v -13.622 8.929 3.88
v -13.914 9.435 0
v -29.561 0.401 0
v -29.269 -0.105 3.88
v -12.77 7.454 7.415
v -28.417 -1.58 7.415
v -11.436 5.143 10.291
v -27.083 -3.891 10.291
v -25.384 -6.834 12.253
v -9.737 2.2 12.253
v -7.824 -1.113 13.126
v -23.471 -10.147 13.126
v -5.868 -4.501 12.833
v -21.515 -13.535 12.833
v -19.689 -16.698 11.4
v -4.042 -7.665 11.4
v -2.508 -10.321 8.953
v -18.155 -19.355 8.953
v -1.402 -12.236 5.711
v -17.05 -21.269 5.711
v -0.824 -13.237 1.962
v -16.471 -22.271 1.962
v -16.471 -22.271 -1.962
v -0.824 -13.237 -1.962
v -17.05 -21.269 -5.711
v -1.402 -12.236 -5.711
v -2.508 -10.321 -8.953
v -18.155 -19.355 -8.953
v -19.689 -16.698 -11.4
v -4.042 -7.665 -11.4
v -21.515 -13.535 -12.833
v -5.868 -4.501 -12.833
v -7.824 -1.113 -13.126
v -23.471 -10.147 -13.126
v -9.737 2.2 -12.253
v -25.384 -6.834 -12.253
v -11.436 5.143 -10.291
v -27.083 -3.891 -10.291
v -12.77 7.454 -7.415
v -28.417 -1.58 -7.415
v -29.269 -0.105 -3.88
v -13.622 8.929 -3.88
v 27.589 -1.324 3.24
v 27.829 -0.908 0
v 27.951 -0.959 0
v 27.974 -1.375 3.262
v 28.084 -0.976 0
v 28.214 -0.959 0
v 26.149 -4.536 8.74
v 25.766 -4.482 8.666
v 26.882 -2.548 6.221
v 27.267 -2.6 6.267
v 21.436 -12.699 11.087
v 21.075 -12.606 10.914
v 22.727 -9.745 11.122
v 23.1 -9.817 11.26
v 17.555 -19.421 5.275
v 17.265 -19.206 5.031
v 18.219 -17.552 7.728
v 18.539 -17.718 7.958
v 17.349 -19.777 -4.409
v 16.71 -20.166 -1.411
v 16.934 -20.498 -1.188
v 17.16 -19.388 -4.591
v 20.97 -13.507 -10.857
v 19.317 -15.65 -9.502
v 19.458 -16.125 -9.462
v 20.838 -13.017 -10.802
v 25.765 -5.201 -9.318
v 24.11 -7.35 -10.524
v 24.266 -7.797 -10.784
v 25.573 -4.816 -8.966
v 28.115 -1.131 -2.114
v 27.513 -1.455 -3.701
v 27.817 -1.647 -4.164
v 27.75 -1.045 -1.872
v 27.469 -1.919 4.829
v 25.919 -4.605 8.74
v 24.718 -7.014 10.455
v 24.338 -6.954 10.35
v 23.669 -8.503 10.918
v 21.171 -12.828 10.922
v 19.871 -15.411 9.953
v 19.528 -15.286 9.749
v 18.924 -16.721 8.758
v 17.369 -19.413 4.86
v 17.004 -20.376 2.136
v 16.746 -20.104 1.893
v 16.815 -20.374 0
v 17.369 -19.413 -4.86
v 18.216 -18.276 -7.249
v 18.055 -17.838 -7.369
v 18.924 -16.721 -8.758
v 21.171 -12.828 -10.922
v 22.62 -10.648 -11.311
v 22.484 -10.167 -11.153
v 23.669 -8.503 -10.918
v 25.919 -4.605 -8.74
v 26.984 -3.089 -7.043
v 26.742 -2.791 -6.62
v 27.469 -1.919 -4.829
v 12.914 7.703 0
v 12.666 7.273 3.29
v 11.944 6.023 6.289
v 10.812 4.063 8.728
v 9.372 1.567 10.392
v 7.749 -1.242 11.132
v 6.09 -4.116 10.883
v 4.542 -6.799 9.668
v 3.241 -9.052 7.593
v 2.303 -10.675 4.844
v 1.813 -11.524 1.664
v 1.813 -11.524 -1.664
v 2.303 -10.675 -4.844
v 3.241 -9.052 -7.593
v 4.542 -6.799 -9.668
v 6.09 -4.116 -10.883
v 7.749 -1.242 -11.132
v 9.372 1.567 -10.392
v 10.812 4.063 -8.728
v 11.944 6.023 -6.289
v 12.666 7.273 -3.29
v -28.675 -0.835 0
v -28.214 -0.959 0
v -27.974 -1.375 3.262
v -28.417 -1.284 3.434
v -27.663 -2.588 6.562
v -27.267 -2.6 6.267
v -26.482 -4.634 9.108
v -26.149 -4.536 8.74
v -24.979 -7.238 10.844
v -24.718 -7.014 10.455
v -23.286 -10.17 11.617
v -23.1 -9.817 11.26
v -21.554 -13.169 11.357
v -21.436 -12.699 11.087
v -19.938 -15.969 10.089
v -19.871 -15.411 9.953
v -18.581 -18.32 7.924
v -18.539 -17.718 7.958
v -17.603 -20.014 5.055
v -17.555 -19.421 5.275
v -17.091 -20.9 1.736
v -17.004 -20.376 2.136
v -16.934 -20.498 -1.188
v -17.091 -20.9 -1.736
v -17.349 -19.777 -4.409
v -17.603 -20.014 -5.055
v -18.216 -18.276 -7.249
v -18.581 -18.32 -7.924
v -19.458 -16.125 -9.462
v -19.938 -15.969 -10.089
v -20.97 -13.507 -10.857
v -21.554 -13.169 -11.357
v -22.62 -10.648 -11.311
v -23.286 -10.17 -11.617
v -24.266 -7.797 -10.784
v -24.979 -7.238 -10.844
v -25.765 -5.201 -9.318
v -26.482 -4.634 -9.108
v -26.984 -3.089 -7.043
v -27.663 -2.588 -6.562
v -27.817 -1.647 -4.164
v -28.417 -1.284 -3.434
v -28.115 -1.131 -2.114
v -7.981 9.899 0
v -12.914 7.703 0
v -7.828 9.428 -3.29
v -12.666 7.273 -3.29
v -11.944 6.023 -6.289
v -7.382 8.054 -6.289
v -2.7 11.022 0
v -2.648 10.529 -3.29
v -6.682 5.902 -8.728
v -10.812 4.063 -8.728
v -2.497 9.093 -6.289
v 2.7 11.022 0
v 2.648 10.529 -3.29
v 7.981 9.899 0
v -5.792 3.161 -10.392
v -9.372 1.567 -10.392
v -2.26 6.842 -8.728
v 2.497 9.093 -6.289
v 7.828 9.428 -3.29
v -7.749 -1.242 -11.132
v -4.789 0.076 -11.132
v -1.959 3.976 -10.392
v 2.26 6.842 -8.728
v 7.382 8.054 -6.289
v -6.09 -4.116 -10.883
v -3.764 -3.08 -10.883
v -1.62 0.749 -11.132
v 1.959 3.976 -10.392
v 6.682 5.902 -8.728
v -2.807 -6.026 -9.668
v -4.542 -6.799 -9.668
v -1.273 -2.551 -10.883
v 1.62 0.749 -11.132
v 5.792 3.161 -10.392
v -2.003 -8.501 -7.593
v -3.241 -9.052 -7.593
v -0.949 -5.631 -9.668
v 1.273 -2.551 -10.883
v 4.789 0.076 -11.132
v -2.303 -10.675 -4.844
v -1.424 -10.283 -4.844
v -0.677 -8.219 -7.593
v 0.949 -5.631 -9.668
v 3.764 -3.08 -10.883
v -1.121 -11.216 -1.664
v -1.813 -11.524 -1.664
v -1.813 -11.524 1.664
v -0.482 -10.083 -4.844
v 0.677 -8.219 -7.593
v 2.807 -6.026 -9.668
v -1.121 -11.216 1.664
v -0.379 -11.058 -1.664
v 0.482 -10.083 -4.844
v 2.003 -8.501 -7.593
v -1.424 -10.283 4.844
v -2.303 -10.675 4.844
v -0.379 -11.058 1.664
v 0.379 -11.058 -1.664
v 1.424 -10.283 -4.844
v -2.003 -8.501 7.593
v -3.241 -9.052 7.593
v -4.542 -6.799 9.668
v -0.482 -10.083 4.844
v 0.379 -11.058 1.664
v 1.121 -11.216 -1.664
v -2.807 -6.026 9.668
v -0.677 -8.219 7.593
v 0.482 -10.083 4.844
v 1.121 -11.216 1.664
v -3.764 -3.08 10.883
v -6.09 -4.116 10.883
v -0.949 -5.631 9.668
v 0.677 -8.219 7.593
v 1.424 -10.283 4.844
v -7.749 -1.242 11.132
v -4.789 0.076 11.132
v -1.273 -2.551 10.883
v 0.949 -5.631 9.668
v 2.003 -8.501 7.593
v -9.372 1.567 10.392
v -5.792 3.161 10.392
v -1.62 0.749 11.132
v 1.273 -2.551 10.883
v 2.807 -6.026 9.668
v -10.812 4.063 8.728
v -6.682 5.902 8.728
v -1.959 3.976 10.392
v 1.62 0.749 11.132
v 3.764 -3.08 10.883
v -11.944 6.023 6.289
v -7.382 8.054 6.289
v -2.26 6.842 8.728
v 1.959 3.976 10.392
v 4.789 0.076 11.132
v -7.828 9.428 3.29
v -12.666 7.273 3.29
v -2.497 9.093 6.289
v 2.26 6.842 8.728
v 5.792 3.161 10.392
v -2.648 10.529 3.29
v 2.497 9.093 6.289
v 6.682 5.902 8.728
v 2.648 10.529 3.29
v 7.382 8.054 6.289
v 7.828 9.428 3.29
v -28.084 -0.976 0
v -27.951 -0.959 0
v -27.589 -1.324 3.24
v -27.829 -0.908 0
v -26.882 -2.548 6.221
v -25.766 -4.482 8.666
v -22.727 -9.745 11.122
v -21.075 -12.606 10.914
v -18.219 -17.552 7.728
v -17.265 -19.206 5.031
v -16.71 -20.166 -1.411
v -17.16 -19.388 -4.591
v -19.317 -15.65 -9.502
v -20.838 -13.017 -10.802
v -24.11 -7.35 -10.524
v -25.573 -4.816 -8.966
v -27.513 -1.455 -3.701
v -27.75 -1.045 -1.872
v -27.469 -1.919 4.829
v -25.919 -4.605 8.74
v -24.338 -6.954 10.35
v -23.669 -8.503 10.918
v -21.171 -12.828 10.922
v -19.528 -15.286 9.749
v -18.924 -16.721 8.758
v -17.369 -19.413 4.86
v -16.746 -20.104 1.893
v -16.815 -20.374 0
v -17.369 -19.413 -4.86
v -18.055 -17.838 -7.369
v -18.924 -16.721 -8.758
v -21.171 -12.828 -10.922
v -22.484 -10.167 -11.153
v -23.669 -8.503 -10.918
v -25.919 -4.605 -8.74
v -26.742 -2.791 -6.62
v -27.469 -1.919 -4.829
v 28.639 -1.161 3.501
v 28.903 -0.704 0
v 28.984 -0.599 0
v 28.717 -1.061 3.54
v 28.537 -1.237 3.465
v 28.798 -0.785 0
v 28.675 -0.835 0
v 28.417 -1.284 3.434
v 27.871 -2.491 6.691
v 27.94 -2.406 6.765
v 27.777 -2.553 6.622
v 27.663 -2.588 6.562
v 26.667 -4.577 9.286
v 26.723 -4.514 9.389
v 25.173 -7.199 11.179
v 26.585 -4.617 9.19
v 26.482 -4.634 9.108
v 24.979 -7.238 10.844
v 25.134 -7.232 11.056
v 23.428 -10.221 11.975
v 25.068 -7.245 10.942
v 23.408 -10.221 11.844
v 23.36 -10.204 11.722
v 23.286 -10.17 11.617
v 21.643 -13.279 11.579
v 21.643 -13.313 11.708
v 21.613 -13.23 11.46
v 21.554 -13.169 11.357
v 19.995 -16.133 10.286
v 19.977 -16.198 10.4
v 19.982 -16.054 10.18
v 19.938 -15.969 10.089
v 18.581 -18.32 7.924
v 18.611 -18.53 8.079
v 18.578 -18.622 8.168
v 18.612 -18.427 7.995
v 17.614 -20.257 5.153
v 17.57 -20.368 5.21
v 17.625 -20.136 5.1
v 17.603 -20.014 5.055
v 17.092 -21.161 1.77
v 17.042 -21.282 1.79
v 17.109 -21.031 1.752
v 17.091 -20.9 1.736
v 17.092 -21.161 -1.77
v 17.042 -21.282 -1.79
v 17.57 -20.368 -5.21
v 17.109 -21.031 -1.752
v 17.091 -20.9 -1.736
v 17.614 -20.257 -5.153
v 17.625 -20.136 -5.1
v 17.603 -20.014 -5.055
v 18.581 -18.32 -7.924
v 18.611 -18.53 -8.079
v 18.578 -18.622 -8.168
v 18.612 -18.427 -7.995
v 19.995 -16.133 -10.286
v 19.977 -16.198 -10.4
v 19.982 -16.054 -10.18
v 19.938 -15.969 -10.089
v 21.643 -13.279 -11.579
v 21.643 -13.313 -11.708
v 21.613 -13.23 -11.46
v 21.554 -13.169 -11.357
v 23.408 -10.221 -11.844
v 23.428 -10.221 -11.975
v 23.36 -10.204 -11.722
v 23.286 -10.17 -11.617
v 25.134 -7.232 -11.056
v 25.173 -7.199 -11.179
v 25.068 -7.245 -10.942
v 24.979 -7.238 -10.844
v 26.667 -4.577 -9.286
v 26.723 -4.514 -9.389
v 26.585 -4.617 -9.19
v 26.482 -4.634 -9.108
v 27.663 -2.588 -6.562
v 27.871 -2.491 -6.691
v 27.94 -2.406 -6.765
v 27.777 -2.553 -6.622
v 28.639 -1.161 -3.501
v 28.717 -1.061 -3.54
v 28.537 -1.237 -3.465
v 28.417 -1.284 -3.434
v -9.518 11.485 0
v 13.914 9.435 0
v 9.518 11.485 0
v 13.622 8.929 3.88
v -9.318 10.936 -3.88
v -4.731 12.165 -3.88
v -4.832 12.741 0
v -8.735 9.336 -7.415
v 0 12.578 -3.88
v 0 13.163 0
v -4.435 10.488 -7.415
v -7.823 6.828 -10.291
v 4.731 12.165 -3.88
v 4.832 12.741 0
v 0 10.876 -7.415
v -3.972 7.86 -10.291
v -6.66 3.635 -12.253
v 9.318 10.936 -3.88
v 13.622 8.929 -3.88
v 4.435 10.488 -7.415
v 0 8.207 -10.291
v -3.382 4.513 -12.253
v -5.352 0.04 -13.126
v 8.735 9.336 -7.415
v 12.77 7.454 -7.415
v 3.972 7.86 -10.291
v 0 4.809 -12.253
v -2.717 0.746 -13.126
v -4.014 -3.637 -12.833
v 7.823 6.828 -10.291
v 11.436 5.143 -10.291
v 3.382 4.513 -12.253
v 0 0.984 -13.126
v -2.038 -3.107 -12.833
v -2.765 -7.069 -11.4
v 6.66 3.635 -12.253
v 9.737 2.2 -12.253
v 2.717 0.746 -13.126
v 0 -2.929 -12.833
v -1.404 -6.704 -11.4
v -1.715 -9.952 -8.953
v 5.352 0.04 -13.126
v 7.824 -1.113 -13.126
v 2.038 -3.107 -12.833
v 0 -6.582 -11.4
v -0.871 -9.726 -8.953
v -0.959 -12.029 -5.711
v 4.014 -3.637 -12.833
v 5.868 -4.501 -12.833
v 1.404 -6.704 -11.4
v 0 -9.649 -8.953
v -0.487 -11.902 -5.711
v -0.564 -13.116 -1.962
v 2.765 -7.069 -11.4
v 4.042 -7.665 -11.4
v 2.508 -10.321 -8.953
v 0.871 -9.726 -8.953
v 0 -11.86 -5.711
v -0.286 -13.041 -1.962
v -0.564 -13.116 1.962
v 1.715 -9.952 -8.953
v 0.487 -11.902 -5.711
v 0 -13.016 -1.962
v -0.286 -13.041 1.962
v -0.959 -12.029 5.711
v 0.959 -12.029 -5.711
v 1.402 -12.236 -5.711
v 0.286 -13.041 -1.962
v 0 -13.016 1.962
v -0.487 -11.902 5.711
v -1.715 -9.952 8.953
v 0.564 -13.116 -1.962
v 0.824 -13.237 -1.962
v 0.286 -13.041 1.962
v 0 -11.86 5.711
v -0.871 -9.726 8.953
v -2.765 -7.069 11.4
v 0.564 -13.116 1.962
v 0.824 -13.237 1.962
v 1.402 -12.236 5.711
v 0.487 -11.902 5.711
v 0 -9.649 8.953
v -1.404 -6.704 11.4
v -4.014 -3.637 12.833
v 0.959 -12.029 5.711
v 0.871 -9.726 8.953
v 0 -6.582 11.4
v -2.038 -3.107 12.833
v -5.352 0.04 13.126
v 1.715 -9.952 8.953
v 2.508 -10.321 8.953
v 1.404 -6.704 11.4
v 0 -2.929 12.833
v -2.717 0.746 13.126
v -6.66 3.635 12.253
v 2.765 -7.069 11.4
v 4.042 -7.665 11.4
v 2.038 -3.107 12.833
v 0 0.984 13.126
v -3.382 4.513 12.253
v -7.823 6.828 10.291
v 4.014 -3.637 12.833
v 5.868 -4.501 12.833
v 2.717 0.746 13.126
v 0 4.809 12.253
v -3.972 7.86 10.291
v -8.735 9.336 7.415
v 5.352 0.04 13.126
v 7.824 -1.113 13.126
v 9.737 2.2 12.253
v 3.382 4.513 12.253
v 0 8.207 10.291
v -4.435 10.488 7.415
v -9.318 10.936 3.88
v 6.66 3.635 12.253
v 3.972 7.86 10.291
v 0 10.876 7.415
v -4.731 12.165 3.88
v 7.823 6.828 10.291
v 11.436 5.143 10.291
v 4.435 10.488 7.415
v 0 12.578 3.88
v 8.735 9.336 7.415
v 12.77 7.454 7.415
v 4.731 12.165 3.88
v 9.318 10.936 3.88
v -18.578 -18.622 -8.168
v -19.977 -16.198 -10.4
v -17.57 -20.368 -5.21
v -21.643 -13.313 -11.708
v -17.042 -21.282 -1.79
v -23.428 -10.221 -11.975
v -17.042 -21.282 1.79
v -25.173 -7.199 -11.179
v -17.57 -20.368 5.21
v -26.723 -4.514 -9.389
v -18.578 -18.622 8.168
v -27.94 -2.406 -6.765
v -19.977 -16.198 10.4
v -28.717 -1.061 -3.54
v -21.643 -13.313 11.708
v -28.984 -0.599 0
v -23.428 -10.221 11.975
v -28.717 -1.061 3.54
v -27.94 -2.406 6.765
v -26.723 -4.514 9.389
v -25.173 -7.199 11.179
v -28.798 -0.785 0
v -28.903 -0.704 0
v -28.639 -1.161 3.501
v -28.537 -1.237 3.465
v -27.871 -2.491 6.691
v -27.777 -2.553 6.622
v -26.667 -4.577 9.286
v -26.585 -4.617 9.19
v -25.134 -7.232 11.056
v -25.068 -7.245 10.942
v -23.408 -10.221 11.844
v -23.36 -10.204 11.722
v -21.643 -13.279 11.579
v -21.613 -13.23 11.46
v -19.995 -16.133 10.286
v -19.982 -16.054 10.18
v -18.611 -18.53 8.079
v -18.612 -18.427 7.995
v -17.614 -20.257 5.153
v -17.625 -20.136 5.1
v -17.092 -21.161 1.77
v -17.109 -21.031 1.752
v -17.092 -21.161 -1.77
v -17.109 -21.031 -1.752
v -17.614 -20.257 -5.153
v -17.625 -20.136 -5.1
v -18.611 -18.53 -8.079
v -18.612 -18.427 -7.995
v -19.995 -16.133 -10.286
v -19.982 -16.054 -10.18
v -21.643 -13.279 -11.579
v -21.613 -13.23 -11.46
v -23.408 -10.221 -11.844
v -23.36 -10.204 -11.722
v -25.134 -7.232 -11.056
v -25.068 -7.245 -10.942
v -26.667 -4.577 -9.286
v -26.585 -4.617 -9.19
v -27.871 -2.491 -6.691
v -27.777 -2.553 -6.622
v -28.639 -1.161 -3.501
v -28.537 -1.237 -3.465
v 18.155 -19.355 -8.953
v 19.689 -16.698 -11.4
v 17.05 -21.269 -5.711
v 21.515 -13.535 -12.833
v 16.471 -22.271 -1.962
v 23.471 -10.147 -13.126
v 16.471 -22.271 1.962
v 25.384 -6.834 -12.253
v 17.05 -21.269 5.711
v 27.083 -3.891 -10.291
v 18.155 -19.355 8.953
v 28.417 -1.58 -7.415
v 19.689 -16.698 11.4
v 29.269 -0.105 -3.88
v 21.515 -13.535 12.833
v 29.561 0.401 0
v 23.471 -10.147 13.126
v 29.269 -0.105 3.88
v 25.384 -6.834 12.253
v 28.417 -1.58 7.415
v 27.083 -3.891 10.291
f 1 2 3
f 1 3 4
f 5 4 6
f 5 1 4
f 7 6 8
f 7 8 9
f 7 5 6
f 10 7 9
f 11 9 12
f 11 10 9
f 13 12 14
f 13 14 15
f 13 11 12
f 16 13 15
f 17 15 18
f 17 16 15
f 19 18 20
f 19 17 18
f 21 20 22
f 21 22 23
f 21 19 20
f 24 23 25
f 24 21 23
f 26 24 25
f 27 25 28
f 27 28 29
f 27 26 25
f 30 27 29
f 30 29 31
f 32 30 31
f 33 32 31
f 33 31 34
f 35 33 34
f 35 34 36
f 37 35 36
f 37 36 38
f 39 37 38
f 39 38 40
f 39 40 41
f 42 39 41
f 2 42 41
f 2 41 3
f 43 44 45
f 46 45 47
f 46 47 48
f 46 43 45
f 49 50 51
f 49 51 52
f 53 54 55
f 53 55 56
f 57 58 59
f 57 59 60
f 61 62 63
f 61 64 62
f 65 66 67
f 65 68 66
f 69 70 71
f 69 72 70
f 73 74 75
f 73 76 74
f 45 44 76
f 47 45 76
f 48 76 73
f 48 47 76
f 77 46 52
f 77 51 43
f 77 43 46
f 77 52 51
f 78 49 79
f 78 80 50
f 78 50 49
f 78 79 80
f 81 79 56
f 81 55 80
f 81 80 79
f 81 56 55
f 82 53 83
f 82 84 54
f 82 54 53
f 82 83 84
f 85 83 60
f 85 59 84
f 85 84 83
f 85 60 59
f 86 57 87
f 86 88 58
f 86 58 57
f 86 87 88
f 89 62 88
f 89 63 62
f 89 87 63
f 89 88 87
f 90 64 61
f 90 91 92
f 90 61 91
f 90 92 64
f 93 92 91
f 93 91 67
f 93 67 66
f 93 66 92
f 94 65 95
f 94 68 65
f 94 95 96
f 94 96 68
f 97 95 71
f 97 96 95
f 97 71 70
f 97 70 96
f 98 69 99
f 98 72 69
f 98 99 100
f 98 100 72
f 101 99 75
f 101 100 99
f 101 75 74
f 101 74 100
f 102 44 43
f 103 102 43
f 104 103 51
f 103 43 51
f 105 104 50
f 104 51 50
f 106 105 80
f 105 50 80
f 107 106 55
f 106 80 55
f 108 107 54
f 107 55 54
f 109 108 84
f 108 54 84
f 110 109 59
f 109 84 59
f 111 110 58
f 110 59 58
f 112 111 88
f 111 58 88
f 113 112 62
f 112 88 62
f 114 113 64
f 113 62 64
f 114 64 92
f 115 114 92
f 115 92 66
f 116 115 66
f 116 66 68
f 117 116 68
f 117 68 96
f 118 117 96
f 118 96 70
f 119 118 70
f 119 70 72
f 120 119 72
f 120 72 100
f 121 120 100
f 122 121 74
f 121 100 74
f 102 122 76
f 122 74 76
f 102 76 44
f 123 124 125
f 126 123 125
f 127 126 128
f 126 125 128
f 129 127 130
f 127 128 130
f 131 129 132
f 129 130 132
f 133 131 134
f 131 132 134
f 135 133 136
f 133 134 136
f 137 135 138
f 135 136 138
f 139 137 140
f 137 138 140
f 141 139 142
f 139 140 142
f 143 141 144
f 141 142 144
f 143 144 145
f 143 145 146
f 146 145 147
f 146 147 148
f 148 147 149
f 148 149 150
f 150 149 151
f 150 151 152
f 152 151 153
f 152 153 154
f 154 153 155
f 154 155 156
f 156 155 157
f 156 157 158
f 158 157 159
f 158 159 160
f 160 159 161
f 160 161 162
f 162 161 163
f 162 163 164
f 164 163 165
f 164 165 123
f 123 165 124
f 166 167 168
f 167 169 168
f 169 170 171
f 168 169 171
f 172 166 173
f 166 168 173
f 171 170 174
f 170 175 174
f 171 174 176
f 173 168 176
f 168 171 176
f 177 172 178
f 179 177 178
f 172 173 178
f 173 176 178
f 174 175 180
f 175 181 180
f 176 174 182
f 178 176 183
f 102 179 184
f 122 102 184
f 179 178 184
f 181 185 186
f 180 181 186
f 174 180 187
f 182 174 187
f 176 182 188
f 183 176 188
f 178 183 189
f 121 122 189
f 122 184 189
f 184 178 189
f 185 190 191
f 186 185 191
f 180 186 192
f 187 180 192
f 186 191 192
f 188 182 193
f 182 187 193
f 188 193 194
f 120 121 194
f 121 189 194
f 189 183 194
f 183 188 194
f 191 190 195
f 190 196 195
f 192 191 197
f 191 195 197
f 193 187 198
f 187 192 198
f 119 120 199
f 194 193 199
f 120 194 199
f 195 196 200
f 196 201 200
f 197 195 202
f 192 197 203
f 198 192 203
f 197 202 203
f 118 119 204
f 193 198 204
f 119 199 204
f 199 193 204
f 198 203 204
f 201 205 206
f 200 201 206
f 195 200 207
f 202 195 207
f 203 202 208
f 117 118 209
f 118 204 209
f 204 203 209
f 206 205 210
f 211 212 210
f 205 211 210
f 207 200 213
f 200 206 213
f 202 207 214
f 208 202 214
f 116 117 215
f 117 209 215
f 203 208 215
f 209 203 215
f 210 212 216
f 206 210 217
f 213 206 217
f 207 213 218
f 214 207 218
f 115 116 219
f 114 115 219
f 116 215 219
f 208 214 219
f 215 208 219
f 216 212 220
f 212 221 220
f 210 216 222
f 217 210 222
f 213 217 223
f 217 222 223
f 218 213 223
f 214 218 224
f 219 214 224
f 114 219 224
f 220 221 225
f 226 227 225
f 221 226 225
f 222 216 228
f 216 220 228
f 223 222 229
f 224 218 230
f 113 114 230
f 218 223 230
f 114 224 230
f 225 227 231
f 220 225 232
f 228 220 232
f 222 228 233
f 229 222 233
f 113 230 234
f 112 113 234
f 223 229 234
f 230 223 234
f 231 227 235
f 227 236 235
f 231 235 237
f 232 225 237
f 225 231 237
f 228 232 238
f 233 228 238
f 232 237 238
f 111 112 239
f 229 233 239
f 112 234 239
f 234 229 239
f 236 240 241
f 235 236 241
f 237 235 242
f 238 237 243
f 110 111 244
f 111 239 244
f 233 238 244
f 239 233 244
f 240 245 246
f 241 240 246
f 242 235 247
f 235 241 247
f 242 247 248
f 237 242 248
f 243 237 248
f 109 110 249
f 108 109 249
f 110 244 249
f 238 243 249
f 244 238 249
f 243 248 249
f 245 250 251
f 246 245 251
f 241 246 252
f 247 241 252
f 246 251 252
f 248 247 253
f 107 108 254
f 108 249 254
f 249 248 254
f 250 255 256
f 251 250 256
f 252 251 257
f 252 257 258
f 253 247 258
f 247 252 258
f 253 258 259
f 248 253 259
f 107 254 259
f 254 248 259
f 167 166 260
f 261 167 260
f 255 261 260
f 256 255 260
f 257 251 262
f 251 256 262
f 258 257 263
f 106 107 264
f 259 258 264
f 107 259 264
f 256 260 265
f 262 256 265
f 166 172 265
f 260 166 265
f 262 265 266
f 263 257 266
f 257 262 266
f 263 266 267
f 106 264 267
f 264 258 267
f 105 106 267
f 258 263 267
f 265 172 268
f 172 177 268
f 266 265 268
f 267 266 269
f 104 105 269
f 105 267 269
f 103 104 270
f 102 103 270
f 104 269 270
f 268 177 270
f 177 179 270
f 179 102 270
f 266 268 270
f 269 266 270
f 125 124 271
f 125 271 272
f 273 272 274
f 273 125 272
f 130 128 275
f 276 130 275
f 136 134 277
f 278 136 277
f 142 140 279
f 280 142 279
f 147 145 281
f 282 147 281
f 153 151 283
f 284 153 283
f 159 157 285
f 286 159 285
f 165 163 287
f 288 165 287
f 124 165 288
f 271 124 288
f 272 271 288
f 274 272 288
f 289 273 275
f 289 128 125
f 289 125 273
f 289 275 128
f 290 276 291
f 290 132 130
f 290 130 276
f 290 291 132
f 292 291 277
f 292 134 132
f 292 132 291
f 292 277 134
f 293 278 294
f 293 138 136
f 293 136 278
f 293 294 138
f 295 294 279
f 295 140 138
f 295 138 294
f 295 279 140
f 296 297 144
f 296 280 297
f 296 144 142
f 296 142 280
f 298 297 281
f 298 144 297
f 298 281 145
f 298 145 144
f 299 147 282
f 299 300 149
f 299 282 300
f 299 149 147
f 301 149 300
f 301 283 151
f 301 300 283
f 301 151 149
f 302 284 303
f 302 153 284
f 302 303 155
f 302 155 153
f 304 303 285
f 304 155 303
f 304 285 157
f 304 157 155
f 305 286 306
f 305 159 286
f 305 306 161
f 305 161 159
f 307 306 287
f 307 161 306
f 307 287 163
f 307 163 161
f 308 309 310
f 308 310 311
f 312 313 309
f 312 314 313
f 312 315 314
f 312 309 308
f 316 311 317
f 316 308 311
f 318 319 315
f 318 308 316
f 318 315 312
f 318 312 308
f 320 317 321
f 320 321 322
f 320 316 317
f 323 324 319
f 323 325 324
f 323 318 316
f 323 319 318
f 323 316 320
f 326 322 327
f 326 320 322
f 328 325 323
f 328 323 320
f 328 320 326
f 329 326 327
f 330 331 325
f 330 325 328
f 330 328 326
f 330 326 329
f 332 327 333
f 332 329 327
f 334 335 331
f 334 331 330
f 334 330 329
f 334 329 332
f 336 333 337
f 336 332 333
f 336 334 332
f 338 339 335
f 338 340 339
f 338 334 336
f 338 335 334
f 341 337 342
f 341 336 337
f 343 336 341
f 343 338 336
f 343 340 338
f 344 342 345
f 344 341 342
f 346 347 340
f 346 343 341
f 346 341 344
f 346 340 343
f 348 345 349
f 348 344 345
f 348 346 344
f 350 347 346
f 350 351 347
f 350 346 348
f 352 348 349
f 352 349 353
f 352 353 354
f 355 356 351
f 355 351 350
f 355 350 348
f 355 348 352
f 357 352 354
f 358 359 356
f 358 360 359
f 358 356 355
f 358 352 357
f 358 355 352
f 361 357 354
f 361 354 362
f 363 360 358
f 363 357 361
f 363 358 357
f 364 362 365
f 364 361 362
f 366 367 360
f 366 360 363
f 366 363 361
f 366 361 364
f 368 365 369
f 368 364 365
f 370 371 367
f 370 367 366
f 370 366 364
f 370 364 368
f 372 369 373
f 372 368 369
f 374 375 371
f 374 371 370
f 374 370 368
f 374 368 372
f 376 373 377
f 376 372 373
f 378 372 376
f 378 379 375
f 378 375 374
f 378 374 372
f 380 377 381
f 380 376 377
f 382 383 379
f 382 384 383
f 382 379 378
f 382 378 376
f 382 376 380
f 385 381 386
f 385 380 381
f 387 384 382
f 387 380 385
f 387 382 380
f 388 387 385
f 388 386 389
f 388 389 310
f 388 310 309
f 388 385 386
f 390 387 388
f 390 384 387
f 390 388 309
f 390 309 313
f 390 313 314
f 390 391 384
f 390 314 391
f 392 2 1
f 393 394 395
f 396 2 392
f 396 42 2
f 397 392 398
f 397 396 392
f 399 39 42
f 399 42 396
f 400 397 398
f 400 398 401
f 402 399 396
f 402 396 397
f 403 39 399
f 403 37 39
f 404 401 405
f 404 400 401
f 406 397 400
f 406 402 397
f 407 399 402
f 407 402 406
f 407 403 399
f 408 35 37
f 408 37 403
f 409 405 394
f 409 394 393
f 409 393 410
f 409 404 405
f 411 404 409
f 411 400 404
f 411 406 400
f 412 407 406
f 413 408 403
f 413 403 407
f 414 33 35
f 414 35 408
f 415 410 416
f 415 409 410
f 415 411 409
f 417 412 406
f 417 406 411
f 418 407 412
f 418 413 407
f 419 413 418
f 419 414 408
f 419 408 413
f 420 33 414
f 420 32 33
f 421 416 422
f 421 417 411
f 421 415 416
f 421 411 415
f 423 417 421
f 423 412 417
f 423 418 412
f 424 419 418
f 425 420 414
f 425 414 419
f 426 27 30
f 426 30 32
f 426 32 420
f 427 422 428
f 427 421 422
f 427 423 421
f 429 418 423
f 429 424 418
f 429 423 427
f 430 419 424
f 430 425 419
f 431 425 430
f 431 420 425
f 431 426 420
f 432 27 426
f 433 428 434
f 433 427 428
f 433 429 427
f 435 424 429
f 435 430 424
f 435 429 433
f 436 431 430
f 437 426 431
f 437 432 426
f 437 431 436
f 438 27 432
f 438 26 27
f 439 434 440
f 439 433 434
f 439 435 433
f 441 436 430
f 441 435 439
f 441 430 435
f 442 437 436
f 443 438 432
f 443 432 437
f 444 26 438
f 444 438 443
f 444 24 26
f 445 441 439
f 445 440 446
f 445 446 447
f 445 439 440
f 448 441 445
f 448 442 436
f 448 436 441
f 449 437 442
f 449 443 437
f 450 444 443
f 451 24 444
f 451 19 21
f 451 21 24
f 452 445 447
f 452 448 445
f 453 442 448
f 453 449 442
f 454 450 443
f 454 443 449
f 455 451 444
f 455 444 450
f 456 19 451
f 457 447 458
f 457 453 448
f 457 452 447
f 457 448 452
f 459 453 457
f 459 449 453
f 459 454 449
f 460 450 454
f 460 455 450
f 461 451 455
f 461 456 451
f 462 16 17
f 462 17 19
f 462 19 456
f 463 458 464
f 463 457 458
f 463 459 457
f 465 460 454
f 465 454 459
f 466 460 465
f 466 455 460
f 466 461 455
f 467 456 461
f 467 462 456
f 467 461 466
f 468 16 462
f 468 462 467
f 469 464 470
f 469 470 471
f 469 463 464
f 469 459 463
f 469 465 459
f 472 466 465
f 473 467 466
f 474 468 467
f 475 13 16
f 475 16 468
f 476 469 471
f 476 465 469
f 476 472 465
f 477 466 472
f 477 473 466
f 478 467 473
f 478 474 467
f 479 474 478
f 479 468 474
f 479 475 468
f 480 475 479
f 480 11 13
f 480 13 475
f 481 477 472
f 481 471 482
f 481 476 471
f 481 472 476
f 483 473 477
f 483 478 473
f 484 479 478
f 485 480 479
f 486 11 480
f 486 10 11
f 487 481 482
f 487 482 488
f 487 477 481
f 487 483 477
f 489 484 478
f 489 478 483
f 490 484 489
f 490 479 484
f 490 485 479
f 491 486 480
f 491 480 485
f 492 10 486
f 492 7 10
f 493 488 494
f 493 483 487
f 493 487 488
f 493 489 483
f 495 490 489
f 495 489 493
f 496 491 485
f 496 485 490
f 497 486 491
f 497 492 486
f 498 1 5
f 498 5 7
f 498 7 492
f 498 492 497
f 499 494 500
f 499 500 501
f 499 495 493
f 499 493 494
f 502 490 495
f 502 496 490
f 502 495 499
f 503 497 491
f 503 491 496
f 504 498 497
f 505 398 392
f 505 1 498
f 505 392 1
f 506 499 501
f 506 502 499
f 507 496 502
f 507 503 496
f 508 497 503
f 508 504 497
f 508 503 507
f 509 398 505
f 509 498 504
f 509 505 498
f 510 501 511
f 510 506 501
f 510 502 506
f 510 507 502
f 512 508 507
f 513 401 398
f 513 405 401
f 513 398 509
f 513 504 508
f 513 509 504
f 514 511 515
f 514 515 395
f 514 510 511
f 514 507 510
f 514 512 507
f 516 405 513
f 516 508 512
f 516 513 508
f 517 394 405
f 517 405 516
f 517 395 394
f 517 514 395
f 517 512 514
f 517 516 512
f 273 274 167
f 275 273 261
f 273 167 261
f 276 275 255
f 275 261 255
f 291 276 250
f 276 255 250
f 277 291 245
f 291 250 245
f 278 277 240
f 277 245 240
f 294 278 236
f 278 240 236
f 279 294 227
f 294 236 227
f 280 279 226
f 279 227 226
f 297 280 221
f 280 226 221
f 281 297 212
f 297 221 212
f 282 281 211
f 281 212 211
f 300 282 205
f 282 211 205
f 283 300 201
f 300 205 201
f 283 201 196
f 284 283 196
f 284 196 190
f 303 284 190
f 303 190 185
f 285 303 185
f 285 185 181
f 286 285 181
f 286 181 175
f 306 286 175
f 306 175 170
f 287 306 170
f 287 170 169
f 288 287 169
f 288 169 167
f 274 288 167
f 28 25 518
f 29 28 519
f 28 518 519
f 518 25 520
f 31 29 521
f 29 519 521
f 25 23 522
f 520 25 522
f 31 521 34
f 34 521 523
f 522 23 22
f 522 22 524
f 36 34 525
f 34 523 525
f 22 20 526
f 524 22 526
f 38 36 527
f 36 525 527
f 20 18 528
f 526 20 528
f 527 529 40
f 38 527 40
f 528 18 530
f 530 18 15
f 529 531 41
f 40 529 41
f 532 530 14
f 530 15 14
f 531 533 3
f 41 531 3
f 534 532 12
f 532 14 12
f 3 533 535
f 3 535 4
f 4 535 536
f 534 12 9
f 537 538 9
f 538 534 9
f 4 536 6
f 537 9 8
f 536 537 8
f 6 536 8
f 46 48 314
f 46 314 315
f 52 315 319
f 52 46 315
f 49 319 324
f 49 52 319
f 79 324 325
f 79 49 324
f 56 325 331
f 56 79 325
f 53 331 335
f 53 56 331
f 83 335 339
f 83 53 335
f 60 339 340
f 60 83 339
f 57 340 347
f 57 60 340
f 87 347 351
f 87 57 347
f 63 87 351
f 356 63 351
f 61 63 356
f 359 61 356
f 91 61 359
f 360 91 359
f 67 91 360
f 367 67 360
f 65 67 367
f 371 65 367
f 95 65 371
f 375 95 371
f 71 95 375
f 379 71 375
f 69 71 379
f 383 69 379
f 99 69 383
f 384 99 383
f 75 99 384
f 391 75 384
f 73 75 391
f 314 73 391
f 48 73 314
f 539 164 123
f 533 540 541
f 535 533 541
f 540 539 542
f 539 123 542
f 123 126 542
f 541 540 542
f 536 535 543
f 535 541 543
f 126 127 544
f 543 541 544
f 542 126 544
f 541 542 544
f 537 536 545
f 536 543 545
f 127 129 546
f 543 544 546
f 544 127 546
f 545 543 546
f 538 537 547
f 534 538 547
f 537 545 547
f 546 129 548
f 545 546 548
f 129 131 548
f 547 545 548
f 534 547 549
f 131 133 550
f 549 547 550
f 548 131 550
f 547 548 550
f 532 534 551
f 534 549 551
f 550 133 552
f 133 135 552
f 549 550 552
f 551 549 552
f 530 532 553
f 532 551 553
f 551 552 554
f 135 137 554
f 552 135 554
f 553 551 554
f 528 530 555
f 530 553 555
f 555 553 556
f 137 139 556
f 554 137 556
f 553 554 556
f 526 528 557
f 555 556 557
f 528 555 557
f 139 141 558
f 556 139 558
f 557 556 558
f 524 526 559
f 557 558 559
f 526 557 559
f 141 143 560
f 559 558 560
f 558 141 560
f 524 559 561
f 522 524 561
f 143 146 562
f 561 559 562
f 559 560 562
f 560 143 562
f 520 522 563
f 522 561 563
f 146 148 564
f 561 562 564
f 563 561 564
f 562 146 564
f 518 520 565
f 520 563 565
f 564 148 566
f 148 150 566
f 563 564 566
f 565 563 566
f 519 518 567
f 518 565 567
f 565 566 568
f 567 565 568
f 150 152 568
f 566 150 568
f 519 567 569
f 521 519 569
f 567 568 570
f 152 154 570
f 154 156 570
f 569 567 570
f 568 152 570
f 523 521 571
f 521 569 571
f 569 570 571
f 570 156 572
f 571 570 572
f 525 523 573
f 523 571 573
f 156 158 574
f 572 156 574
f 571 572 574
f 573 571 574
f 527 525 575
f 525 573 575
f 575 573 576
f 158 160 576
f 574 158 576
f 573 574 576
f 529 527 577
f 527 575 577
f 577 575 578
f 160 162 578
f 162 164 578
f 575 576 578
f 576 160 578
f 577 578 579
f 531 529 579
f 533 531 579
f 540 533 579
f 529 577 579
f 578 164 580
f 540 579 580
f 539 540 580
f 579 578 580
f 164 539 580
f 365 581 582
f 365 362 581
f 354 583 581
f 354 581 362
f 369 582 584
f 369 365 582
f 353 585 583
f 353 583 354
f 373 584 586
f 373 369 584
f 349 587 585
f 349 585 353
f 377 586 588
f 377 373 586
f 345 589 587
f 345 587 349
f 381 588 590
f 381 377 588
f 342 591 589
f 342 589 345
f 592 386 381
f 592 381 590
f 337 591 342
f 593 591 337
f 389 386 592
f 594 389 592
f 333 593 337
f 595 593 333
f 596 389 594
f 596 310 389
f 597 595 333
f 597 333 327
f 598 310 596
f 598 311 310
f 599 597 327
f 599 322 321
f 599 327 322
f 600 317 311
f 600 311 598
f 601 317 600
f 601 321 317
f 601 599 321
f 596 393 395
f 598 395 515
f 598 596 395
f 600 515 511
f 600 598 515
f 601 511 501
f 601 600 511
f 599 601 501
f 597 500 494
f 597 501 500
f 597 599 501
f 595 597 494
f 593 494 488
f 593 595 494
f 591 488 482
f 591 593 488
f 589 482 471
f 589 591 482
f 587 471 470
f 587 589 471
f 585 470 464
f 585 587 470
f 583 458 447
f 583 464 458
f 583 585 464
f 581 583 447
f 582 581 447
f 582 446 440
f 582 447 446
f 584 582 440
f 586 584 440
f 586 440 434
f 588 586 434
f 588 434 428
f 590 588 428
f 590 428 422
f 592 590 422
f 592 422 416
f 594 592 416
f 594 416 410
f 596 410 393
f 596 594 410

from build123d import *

# Parameters (mm, degrees)
F1_R    = 13.1633
F1_R_2  = 11.1633
F3_SIZE = 0.635
F4_R    = 0.508


with BuildPart() as f2:
    # F2: sweep along a path in F0
    with BuildLine(Plane.XY) as f2_path:
        Line((-21.9970452561, -12.7), (-6.35, -3.6661742094))
        ThreePointArc((-6.35, -3.6661742094), (0, -1.9646968374), (6.35, -3.6661742094))
        Line((6.35, -3.6661742094), (21.9970452561, -12.7))
    # F1 (on Right) → F2 (sweep)
    with BuildSketch(Plane.YZ):
        Circle(F1_R)
        Circle(F1_R_2, mode=Mode.SUBTRACT)
    sweep(path=f2_path.line)

    # F3
    f3_edges = [f2.edges().sort_by_distance(p)[0] for p in [
        (17.397744, -20.666224, 0),
        (-17.397744, -20.666224, 0),
    ]]
    chamfer(f3_edges, length=F3_SIZE)

    # F4
    f4_edges = [f2.edges().sort_by_distance(p)[0] for p in [
        (-17.080244, -21.21615, 0),
        (-16.847818, -20.348724, 0),
        (16.847818, -20.348724, 0),
        (17.080244, -21.21615, 0),
    ]]
    fillet(f4_edges, radius=F4_R)


solid = f2.part
